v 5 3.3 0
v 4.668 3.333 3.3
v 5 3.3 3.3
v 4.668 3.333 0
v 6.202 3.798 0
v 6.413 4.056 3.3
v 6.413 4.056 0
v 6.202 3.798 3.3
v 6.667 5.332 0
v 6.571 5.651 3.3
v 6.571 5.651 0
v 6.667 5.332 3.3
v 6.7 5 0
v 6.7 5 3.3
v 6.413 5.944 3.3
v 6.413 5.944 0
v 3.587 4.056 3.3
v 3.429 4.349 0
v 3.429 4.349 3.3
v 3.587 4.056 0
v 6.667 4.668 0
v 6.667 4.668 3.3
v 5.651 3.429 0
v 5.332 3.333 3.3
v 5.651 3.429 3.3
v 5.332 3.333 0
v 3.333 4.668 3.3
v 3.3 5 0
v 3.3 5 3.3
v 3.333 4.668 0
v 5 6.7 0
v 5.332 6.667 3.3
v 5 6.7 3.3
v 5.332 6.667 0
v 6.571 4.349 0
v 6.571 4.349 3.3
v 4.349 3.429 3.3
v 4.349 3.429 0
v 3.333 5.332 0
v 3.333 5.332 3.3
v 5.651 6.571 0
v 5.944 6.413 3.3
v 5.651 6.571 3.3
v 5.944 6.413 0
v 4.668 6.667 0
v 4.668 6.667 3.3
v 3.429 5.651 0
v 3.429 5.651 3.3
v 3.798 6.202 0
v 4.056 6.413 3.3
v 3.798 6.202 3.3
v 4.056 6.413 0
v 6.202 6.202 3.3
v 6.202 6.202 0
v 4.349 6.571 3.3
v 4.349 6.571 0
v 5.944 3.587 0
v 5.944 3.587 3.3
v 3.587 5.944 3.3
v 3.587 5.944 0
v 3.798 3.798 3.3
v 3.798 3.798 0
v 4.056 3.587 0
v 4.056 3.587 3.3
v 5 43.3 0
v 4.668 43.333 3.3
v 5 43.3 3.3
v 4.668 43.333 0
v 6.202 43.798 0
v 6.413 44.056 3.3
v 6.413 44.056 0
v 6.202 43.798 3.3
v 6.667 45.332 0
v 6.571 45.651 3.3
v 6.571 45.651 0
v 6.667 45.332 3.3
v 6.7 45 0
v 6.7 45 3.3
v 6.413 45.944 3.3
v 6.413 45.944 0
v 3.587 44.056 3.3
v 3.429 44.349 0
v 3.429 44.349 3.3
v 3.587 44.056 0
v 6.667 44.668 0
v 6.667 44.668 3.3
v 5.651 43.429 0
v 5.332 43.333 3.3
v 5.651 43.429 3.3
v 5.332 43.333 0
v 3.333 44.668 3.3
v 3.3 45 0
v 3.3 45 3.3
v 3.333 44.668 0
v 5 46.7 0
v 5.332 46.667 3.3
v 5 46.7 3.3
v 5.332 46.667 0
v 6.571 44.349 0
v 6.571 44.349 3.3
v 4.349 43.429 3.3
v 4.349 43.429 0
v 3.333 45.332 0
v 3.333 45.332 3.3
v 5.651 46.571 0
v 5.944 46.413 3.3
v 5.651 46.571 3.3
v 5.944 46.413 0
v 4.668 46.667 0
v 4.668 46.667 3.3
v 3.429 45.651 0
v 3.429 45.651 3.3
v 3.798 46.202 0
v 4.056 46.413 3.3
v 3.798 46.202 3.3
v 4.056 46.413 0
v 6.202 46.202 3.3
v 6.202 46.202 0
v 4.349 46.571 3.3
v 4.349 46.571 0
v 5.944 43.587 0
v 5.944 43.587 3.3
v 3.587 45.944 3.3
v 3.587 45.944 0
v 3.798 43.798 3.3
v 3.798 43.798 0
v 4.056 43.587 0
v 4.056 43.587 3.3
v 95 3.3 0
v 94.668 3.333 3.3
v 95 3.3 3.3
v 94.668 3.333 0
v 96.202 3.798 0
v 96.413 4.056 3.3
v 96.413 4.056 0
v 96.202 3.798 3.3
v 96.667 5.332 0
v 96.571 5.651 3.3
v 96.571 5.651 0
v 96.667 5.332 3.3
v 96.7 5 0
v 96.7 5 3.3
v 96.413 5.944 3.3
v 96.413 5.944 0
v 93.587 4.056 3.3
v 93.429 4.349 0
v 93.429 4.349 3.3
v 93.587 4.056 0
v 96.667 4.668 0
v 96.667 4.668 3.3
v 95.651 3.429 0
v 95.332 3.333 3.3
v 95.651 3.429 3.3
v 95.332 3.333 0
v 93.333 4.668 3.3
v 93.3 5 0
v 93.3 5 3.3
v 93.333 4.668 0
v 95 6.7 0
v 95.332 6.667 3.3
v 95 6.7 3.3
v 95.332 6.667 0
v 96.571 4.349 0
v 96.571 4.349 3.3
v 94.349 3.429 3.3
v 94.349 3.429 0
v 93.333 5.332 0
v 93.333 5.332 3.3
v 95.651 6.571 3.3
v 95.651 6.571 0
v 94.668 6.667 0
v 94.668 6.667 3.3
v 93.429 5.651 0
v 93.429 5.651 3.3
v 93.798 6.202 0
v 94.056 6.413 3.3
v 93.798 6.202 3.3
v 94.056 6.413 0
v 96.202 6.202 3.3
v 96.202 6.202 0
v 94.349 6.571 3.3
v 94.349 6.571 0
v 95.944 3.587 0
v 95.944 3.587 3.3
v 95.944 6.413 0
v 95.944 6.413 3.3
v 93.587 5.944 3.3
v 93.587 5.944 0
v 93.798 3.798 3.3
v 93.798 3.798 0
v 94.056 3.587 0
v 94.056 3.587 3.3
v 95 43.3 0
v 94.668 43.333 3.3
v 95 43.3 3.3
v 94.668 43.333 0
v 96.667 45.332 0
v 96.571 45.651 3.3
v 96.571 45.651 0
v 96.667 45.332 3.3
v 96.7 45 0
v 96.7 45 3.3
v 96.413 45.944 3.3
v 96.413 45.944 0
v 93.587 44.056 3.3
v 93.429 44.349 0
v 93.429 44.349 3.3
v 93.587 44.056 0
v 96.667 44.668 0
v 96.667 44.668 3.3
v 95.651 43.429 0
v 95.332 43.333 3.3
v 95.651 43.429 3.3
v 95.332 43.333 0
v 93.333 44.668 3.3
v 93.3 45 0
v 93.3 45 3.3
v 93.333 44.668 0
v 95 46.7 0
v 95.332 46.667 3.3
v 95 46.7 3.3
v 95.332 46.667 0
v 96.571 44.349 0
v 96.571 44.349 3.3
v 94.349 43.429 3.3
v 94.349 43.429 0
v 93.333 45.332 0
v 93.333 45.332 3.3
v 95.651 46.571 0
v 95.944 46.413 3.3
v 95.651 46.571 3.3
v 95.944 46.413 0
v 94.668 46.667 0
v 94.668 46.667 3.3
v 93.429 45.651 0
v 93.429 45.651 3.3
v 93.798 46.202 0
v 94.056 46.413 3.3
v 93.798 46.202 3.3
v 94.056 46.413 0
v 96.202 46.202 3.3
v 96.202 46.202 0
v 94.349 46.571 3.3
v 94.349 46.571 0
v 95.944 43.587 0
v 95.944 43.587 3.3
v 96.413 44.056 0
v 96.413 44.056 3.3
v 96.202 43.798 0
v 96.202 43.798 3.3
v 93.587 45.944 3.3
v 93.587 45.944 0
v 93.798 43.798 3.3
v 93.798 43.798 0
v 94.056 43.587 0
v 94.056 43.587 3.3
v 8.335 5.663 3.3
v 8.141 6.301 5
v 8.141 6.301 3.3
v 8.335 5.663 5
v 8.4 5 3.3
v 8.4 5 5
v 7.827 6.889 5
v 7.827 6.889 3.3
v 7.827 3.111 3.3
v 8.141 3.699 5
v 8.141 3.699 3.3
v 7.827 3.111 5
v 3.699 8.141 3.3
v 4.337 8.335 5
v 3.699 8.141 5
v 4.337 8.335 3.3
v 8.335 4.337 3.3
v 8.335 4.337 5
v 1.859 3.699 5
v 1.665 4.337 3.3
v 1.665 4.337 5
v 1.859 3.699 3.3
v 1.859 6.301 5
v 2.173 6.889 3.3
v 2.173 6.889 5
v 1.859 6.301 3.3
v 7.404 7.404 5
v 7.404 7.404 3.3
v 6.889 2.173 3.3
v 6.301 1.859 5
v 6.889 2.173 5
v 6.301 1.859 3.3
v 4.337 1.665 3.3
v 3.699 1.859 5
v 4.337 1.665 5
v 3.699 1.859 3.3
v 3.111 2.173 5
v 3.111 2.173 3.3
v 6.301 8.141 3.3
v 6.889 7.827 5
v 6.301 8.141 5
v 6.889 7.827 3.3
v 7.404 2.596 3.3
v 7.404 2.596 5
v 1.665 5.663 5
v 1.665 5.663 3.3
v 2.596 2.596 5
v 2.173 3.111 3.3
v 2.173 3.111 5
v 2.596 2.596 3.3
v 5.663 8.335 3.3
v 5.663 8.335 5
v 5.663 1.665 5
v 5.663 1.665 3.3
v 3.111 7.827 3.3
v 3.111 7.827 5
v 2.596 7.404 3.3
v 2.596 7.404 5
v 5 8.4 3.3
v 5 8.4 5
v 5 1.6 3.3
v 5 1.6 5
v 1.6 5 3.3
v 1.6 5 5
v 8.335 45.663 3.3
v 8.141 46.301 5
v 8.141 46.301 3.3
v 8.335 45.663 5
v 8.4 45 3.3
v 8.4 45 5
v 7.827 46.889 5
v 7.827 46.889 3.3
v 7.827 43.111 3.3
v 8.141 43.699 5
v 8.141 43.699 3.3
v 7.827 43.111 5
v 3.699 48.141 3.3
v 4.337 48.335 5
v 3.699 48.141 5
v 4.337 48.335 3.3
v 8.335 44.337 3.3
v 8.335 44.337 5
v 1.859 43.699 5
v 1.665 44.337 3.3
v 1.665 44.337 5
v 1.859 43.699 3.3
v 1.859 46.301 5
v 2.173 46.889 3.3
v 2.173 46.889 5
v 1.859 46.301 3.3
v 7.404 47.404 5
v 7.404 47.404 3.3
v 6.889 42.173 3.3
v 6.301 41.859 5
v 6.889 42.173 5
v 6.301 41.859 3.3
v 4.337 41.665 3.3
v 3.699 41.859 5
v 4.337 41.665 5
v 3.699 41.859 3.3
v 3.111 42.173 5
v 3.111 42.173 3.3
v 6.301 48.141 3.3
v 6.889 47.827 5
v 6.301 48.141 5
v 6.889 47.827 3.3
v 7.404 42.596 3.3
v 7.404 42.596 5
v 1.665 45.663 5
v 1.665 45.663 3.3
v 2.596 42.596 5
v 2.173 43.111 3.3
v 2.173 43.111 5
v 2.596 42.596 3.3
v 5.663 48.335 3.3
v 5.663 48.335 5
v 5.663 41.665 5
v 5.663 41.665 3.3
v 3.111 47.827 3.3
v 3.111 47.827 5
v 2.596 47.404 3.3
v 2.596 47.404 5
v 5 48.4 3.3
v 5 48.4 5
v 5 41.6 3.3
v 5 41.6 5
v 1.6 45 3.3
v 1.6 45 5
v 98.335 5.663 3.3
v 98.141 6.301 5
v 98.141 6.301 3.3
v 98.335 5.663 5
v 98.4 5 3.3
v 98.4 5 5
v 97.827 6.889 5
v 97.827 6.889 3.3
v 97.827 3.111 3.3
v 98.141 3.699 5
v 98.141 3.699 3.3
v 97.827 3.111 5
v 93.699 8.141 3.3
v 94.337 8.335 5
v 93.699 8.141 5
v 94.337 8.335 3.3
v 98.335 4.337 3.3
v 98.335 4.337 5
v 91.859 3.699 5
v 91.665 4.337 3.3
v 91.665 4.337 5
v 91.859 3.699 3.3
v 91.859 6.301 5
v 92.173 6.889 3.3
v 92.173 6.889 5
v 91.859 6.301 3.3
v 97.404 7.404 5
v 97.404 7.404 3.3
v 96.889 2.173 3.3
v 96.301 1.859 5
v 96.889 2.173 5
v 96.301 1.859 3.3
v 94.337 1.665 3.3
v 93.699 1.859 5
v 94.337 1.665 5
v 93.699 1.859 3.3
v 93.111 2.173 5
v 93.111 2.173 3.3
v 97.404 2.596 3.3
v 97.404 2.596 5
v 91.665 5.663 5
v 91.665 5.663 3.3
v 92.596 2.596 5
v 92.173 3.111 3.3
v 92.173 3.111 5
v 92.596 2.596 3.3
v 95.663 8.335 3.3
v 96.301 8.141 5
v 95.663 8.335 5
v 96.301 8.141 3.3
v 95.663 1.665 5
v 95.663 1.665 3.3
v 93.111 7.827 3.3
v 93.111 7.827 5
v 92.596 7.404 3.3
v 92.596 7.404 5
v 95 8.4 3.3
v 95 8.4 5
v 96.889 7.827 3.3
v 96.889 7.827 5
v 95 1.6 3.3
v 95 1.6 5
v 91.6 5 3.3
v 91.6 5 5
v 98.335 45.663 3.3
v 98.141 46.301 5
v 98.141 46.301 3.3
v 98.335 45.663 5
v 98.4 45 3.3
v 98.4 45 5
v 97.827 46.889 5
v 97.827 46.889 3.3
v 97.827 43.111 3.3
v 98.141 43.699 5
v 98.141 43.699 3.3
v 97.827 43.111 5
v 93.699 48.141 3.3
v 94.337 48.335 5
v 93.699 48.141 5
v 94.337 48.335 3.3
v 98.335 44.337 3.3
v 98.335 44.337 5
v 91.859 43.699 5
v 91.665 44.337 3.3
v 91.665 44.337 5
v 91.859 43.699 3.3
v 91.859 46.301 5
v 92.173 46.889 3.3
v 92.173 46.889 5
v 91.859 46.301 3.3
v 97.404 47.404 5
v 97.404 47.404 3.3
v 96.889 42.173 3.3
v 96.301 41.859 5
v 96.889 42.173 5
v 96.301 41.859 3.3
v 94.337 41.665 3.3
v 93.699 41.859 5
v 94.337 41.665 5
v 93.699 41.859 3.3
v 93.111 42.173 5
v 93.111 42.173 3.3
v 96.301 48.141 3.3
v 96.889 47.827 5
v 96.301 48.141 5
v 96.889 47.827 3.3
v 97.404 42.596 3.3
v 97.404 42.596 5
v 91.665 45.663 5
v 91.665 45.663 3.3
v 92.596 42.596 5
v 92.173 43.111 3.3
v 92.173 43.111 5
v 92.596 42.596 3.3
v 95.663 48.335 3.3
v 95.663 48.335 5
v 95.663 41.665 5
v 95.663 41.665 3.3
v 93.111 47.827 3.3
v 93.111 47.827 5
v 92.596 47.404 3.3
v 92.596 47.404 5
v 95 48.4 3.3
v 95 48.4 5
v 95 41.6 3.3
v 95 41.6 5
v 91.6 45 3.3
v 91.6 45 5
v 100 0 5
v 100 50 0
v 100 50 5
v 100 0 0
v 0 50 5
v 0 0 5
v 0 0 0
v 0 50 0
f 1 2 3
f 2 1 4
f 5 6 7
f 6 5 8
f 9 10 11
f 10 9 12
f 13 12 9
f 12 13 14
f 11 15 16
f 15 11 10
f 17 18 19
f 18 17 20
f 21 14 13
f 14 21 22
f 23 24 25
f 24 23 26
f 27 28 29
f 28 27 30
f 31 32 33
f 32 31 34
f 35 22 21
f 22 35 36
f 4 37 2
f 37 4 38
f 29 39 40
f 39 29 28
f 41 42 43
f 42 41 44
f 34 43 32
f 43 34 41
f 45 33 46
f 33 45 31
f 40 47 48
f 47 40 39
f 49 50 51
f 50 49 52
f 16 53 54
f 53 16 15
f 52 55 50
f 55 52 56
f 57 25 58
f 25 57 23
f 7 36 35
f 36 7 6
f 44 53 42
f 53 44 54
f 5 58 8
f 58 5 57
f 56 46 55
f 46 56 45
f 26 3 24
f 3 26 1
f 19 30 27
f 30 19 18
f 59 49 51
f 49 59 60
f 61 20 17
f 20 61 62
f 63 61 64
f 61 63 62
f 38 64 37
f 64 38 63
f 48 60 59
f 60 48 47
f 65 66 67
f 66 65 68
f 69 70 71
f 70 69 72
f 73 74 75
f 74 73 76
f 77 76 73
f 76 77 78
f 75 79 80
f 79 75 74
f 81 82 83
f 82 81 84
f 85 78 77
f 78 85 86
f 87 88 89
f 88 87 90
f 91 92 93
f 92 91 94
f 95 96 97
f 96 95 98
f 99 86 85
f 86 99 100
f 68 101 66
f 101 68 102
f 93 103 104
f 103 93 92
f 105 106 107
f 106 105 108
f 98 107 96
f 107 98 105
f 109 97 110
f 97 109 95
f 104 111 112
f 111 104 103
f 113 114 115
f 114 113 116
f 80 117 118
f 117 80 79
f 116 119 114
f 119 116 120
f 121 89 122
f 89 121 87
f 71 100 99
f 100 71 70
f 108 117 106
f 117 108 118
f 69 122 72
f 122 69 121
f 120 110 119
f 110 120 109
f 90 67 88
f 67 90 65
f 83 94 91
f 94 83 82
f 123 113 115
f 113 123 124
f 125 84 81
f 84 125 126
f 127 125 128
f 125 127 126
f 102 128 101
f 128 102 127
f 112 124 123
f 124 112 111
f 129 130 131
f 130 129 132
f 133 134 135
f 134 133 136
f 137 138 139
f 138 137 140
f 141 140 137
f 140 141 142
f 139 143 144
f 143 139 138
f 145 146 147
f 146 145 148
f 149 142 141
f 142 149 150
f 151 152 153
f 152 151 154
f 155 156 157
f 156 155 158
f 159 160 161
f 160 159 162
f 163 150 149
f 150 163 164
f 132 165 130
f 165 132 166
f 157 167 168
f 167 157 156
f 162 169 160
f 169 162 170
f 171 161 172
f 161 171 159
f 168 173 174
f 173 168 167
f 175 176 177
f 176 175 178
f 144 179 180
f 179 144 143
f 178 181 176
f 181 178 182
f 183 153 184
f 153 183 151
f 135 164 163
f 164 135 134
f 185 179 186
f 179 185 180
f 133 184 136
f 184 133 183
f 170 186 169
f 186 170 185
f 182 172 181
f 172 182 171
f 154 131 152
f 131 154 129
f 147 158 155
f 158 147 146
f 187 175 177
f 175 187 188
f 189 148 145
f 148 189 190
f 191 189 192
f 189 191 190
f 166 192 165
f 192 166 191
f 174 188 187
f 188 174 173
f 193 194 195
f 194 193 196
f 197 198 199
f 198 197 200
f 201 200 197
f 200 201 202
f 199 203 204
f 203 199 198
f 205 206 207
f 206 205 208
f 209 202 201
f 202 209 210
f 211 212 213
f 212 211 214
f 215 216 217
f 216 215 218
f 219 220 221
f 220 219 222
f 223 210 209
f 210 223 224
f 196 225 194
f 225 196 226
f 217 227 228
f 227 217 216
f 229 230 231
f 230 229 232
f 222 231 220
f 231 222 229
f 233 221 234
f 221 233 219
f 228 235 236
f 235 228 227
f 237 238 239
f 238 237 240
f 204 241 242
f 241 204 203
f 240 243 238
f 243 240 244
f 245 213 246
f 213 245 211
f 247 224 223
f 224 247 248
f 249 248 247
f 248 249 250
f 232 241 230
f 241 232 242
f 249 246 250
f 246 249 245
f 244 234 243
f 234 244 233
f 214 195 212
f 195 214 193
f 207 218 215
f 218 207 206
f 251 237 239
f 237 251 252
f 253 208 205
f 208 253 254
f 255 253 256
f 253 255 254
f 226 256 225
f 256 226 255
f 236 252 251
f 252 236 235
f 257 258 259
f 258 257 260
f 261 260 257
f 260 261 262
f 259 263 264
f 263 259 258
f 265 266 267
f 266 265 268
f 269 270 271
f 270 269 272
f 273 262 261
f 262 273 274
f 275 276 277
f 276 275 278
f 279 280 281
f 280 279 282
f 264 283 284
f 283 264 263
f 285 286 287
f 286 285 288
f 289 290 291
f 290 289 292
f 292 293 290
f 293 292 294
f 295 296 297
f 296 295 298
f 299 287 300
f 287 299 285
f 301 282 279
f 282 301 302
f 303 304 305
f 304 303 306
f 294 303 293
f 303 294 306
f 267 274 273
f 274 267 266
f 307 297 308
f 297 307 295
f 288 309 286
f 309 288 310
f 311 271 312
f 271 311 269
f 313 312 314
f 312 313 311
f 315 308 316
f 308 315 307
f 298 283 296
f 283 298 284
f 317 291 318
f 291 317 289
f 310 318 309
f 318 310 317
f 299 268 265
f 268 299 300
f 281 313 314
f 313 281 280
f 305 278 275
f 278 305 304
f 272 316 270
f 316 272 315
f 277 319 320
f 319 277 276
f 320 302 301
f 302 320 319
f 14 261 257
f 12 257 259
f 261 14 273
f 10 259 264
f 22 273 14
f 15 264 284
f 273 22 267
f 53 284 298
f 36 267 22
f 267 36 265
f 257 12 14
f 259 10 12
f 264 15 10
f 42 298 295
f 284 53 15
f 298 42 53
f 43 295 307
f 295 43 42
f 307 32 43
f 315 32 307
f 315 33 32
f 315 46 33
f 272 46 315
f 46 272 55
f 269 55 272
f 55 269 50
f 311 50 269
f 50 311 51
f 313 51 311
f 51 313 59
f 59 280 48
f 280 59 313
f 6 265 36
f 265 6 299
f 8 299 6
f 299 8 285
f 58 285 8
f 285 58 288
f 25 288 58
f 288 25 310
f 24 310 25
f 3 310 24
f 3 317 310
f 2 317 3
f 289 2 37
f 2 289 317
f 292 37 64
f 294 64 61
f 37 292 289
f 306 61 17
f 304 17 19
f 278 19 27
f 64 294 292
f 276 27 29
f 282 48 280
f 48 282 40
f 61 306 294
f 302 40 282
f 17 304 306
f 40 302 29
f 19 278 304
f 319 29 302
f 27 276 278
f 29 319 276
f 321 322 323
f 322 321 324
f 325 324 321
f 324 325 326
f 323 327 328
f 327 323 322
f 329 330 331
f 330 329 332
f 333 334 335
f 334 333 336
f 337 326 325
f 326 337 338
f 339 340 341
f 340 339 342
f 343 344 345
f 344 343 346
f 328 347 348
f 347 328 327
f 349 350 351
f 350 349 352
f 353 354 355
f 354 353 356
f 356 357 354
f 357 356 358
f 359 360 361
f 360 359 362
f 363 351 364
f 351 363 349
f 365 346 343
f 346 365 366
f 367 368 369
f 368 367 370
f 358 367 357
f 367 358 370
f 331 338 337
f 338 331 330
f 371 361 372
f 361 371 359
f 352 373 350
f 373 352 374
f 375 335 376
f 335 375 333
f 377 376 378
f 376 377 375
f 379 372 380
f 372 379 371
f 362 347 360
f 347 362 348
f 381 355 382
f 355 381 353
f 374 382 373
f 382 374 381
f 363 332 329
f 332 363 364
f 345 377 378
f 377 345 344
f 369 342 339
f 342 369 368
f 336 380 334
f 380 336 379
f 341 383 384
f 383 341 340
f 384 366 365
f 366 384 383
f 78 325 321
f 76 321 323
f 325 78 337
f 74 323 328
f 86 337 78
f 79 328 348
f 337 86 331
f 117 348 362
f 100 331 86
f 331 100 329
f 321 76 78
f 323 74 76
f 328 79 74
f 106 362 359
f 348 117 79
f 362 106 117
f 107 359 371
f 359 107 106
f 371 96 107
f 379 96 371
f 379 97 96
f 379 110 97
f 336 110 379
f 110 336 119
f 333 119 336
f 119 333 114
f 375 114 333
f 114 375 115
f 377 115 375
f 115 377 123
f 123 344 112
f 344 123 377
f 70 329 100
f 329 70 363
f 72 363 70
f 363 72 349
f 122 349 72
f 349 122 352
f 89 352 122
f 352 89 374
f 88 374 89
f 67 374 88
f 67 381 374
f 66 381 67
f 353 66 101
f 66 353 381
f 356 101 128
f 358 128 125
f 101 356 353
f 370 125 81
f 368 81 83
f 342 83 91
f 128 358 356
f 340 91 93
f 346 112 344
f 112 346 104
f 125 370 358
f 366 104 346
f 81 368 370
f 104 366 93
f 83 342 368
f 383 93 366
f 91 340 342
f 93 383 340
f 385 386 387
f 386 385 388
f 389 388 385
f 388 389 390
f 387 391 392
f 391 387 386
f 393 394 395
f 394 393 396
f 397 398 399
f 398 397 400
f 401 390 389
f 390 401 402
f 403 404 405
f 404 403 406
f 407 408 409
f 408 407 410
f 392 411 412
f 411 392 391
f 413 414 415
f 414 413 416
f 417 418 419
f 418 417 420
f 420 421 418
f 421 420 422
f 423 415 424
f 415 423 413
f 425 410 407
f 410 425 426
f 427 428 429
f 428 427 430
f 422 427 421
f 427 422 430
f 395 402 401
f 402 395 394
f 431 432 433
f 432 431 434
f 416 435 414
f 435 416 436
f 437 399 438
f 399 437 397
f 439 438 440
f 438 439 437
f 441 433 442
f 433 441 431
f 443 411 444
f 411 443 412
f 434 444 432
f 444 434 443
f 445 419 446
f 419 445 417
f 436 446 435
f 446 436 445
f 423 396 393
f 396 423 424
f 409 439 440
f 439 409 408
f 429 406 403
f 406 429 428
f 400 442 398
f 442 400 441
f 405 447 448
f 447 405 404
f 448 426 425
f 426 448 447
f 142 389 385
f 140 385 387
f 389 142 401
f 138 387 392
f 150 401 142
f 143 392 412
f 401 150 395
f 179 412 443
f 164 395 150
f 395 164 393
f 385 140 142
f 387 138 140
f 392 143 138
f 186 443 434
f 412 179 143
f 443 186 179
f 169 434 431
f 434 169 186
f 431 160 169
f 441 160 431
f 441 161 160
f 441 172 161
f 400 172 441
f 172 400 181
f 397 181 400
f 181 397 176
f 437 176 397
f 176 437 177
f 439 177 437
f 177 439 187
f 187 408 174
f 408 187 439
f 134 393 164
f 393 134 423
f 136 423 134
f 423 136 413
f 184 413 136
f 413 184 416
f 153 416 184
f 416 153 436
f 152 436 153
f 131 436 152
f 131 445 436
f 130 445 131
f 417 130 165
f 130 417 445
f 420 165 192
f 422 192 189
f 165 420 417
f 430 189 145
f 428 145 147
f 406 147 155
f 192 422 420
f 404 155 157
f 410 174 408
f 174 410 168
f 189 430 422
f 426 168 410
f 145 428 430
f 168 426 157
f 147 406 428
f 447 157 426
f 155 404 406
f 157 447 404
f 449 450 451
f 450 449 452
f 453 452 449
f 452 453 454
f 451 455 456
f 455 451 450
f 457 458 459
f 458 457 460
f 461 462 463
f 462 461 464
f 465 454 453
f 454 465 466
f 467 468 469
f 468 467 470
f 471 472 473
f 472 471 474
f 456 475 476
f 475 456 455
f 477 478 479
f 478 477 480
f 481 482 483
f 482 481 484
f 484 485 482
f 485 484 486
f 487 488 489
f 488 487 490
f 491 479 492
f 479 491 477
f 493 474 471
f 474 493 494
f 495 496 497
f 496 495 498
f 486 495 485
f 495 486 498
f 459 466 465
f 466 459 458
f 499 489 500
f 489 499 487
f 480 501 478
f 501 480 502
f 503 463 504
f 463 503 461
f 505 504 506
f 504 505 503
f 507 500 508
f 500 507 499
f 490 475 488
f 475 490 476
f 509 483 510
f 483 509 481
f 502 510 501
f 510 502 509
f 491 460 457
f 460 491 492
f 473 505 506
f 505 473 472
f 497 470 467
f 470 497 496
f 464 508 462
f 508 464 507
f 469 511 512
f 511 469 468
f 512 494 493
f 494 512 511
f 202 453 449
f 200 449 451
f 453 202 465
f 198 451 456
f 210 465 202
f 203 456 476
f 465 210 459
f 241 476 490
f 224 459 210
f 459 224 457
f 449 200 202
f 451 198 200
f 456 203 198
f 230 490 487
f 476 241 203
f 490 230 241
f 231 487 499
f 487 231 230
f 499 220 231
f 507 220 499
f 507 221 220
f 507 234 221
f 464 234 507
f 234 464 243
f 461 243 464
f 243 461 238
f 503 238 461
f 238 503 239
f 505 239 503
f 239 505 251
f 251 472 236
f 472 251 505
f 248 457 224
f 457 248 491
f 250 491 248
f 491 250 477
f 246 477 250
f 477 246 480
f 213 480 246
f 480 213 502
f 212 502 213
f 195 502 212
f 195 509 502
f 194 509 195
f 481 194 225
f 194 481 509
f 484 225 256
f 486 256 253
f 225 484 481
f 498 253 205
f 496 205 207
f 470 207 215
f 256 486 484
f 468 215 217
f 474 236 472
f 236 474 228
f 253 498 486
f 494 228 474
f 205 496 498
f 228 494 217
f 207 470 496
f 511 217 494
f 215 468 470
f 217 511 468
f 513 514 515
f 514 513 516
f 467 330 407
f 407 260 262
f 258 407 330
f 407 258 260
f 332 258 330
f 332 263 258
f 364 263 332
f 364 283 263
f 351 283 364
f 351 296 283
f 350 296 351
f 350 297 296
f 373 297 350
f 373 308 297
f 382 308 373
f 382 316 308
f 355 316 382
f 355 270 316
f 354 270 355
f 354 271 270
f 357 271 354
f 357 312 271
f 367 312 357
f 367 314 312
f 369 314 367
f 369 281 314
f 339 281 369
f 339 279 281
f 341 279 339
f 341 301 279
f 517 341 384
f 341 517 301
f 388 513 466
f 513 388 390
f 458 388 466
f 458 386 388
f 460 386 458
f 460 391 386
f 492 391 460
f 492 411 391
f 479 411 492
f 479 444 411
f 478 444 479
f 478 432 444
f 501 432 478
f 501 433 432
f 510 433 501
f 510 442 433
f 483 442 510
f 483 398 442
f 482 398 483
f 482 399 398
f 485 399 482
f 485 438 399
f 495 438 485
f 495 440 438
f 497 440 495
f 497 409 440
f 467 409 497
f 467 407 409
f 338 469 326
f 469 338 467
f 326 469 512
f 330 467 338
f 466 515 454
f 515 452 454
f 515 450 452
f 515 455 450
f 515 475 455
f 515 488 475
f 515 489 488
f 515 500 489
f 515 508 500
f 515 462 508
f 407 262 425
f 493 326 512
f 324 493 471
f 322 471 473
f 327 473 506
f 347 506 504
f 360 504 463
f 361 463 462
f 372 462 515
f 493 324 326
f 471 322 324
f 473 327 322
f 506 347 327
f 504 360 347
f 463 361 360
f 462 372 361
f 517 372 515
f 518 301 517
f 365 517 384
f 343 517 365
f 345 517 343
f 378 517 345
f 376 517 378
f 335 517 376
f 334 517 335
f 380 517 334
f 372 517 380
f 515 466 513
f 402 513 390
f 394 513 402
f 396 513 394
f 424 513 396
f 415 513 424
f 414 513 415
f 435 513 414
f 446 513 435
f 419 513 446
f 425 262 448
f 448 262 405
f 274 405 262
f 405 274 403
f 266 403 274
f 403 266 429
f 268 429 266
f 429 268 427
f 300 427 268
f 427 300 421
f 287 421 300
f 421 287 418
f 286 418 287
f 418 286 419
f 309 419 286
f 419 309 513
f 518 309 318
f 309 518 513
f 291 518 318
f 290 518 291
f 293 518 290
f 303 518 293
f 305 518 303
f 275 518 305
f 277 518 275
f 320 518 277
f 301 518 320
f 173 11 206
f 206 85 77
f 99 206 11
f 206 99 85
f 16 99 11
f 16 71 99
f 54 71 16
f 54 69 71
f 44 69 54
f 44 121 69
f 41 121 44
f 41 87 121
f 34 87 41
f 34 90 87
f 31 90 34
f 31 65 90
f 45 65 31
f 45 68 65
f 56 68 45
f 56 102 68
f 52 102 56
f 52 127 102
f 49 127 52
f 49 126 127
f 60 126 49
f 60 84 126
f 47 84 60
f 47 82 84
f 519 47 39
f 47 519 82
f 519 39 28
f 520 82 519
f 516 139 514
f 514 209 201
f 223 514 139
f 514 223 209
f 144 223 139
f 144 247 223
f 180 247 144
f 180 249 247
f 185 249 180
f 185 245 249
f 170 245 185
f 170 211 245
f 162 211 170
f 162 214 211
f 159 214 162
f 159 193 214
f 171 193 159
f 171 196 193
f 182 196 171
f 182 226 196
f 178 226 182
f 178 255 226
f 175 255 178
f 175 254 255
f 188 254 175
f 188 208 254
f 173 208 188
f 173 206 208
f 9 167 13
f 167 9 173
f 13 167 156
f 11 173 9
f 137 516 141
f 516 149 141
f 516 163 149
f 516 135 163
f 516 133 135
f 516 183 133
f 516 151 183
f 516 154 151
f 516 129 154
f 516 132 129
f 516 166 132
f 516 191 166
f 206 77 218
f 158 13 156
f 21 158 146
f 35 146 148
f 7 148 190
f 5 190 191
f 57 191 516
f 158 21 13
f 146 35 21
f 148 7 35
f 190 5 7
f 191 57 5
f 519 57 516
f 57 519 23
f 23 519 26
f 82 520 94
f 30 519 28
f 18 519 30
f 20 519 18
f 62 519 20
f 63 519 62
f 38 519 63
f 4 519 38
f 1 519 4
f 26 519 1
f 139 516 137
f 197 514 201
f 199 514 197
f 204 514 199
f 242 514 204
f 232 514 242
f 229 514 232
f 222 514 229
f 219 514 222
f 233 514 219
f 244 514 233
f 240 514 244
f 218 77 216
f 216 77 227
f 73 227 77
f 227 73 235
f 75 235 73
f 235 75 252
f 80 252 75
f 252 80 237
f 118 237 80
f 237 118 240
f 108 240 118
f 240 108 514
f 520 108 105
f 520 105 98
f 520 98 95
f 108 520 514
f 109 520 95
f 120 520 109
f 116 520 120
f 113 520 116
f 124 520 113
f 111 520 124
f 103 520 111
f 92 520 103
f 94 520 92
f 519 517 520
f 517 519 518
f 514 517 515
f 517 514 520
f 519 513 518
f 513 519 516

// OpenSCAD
$fn = 32;

// ----------------------------------------------------------------------
// Enclosure lid: 100 x 50 x 5 mm, 4 bolt holes
// ----------------------------------------------------------------------

// --- parameters (mm) ---
length = 100;             // lid length, X
width = 50;               // lid width, Y
plate_t = 5;              // lid plate thickness
bolt_d = 3.4;             // bolt clearance
boss_lip = 5;             // bolt hole inset from the corner
sink = 1;                 // overlap of the lip and ribs into the plate
cs_d = 6.8;               // countersink diameter
cs_h = 1.7;               // countersink depth

module plate() {
  cube([length, width, plate_t]);
}

difference() {
  plate();
  /* bolt pattern matching the corner bosses */
  for (sx = [0, 1]) for (sy = [0, 1])
    translate([sx * (length - 2 * boss_lip) + boss_lip, sy * (width - 2 * boss_lip) + boss_lip, -0 - 1])
      cylinder(h = plate_t + 0 + 2, d = bolt_d);
  /* countersinks so the heads sit flush */
  for (sx = [0, 1]) for (sy = [0, 1])
    translate([sx * (length - 2 * boss_lip) + boss_lip, sy * (width - 2 * boss_lip) + boss_lip, plate_t - cs_h])
      cylinder(h = cs_h + 0.5, d = cs_d);
}
